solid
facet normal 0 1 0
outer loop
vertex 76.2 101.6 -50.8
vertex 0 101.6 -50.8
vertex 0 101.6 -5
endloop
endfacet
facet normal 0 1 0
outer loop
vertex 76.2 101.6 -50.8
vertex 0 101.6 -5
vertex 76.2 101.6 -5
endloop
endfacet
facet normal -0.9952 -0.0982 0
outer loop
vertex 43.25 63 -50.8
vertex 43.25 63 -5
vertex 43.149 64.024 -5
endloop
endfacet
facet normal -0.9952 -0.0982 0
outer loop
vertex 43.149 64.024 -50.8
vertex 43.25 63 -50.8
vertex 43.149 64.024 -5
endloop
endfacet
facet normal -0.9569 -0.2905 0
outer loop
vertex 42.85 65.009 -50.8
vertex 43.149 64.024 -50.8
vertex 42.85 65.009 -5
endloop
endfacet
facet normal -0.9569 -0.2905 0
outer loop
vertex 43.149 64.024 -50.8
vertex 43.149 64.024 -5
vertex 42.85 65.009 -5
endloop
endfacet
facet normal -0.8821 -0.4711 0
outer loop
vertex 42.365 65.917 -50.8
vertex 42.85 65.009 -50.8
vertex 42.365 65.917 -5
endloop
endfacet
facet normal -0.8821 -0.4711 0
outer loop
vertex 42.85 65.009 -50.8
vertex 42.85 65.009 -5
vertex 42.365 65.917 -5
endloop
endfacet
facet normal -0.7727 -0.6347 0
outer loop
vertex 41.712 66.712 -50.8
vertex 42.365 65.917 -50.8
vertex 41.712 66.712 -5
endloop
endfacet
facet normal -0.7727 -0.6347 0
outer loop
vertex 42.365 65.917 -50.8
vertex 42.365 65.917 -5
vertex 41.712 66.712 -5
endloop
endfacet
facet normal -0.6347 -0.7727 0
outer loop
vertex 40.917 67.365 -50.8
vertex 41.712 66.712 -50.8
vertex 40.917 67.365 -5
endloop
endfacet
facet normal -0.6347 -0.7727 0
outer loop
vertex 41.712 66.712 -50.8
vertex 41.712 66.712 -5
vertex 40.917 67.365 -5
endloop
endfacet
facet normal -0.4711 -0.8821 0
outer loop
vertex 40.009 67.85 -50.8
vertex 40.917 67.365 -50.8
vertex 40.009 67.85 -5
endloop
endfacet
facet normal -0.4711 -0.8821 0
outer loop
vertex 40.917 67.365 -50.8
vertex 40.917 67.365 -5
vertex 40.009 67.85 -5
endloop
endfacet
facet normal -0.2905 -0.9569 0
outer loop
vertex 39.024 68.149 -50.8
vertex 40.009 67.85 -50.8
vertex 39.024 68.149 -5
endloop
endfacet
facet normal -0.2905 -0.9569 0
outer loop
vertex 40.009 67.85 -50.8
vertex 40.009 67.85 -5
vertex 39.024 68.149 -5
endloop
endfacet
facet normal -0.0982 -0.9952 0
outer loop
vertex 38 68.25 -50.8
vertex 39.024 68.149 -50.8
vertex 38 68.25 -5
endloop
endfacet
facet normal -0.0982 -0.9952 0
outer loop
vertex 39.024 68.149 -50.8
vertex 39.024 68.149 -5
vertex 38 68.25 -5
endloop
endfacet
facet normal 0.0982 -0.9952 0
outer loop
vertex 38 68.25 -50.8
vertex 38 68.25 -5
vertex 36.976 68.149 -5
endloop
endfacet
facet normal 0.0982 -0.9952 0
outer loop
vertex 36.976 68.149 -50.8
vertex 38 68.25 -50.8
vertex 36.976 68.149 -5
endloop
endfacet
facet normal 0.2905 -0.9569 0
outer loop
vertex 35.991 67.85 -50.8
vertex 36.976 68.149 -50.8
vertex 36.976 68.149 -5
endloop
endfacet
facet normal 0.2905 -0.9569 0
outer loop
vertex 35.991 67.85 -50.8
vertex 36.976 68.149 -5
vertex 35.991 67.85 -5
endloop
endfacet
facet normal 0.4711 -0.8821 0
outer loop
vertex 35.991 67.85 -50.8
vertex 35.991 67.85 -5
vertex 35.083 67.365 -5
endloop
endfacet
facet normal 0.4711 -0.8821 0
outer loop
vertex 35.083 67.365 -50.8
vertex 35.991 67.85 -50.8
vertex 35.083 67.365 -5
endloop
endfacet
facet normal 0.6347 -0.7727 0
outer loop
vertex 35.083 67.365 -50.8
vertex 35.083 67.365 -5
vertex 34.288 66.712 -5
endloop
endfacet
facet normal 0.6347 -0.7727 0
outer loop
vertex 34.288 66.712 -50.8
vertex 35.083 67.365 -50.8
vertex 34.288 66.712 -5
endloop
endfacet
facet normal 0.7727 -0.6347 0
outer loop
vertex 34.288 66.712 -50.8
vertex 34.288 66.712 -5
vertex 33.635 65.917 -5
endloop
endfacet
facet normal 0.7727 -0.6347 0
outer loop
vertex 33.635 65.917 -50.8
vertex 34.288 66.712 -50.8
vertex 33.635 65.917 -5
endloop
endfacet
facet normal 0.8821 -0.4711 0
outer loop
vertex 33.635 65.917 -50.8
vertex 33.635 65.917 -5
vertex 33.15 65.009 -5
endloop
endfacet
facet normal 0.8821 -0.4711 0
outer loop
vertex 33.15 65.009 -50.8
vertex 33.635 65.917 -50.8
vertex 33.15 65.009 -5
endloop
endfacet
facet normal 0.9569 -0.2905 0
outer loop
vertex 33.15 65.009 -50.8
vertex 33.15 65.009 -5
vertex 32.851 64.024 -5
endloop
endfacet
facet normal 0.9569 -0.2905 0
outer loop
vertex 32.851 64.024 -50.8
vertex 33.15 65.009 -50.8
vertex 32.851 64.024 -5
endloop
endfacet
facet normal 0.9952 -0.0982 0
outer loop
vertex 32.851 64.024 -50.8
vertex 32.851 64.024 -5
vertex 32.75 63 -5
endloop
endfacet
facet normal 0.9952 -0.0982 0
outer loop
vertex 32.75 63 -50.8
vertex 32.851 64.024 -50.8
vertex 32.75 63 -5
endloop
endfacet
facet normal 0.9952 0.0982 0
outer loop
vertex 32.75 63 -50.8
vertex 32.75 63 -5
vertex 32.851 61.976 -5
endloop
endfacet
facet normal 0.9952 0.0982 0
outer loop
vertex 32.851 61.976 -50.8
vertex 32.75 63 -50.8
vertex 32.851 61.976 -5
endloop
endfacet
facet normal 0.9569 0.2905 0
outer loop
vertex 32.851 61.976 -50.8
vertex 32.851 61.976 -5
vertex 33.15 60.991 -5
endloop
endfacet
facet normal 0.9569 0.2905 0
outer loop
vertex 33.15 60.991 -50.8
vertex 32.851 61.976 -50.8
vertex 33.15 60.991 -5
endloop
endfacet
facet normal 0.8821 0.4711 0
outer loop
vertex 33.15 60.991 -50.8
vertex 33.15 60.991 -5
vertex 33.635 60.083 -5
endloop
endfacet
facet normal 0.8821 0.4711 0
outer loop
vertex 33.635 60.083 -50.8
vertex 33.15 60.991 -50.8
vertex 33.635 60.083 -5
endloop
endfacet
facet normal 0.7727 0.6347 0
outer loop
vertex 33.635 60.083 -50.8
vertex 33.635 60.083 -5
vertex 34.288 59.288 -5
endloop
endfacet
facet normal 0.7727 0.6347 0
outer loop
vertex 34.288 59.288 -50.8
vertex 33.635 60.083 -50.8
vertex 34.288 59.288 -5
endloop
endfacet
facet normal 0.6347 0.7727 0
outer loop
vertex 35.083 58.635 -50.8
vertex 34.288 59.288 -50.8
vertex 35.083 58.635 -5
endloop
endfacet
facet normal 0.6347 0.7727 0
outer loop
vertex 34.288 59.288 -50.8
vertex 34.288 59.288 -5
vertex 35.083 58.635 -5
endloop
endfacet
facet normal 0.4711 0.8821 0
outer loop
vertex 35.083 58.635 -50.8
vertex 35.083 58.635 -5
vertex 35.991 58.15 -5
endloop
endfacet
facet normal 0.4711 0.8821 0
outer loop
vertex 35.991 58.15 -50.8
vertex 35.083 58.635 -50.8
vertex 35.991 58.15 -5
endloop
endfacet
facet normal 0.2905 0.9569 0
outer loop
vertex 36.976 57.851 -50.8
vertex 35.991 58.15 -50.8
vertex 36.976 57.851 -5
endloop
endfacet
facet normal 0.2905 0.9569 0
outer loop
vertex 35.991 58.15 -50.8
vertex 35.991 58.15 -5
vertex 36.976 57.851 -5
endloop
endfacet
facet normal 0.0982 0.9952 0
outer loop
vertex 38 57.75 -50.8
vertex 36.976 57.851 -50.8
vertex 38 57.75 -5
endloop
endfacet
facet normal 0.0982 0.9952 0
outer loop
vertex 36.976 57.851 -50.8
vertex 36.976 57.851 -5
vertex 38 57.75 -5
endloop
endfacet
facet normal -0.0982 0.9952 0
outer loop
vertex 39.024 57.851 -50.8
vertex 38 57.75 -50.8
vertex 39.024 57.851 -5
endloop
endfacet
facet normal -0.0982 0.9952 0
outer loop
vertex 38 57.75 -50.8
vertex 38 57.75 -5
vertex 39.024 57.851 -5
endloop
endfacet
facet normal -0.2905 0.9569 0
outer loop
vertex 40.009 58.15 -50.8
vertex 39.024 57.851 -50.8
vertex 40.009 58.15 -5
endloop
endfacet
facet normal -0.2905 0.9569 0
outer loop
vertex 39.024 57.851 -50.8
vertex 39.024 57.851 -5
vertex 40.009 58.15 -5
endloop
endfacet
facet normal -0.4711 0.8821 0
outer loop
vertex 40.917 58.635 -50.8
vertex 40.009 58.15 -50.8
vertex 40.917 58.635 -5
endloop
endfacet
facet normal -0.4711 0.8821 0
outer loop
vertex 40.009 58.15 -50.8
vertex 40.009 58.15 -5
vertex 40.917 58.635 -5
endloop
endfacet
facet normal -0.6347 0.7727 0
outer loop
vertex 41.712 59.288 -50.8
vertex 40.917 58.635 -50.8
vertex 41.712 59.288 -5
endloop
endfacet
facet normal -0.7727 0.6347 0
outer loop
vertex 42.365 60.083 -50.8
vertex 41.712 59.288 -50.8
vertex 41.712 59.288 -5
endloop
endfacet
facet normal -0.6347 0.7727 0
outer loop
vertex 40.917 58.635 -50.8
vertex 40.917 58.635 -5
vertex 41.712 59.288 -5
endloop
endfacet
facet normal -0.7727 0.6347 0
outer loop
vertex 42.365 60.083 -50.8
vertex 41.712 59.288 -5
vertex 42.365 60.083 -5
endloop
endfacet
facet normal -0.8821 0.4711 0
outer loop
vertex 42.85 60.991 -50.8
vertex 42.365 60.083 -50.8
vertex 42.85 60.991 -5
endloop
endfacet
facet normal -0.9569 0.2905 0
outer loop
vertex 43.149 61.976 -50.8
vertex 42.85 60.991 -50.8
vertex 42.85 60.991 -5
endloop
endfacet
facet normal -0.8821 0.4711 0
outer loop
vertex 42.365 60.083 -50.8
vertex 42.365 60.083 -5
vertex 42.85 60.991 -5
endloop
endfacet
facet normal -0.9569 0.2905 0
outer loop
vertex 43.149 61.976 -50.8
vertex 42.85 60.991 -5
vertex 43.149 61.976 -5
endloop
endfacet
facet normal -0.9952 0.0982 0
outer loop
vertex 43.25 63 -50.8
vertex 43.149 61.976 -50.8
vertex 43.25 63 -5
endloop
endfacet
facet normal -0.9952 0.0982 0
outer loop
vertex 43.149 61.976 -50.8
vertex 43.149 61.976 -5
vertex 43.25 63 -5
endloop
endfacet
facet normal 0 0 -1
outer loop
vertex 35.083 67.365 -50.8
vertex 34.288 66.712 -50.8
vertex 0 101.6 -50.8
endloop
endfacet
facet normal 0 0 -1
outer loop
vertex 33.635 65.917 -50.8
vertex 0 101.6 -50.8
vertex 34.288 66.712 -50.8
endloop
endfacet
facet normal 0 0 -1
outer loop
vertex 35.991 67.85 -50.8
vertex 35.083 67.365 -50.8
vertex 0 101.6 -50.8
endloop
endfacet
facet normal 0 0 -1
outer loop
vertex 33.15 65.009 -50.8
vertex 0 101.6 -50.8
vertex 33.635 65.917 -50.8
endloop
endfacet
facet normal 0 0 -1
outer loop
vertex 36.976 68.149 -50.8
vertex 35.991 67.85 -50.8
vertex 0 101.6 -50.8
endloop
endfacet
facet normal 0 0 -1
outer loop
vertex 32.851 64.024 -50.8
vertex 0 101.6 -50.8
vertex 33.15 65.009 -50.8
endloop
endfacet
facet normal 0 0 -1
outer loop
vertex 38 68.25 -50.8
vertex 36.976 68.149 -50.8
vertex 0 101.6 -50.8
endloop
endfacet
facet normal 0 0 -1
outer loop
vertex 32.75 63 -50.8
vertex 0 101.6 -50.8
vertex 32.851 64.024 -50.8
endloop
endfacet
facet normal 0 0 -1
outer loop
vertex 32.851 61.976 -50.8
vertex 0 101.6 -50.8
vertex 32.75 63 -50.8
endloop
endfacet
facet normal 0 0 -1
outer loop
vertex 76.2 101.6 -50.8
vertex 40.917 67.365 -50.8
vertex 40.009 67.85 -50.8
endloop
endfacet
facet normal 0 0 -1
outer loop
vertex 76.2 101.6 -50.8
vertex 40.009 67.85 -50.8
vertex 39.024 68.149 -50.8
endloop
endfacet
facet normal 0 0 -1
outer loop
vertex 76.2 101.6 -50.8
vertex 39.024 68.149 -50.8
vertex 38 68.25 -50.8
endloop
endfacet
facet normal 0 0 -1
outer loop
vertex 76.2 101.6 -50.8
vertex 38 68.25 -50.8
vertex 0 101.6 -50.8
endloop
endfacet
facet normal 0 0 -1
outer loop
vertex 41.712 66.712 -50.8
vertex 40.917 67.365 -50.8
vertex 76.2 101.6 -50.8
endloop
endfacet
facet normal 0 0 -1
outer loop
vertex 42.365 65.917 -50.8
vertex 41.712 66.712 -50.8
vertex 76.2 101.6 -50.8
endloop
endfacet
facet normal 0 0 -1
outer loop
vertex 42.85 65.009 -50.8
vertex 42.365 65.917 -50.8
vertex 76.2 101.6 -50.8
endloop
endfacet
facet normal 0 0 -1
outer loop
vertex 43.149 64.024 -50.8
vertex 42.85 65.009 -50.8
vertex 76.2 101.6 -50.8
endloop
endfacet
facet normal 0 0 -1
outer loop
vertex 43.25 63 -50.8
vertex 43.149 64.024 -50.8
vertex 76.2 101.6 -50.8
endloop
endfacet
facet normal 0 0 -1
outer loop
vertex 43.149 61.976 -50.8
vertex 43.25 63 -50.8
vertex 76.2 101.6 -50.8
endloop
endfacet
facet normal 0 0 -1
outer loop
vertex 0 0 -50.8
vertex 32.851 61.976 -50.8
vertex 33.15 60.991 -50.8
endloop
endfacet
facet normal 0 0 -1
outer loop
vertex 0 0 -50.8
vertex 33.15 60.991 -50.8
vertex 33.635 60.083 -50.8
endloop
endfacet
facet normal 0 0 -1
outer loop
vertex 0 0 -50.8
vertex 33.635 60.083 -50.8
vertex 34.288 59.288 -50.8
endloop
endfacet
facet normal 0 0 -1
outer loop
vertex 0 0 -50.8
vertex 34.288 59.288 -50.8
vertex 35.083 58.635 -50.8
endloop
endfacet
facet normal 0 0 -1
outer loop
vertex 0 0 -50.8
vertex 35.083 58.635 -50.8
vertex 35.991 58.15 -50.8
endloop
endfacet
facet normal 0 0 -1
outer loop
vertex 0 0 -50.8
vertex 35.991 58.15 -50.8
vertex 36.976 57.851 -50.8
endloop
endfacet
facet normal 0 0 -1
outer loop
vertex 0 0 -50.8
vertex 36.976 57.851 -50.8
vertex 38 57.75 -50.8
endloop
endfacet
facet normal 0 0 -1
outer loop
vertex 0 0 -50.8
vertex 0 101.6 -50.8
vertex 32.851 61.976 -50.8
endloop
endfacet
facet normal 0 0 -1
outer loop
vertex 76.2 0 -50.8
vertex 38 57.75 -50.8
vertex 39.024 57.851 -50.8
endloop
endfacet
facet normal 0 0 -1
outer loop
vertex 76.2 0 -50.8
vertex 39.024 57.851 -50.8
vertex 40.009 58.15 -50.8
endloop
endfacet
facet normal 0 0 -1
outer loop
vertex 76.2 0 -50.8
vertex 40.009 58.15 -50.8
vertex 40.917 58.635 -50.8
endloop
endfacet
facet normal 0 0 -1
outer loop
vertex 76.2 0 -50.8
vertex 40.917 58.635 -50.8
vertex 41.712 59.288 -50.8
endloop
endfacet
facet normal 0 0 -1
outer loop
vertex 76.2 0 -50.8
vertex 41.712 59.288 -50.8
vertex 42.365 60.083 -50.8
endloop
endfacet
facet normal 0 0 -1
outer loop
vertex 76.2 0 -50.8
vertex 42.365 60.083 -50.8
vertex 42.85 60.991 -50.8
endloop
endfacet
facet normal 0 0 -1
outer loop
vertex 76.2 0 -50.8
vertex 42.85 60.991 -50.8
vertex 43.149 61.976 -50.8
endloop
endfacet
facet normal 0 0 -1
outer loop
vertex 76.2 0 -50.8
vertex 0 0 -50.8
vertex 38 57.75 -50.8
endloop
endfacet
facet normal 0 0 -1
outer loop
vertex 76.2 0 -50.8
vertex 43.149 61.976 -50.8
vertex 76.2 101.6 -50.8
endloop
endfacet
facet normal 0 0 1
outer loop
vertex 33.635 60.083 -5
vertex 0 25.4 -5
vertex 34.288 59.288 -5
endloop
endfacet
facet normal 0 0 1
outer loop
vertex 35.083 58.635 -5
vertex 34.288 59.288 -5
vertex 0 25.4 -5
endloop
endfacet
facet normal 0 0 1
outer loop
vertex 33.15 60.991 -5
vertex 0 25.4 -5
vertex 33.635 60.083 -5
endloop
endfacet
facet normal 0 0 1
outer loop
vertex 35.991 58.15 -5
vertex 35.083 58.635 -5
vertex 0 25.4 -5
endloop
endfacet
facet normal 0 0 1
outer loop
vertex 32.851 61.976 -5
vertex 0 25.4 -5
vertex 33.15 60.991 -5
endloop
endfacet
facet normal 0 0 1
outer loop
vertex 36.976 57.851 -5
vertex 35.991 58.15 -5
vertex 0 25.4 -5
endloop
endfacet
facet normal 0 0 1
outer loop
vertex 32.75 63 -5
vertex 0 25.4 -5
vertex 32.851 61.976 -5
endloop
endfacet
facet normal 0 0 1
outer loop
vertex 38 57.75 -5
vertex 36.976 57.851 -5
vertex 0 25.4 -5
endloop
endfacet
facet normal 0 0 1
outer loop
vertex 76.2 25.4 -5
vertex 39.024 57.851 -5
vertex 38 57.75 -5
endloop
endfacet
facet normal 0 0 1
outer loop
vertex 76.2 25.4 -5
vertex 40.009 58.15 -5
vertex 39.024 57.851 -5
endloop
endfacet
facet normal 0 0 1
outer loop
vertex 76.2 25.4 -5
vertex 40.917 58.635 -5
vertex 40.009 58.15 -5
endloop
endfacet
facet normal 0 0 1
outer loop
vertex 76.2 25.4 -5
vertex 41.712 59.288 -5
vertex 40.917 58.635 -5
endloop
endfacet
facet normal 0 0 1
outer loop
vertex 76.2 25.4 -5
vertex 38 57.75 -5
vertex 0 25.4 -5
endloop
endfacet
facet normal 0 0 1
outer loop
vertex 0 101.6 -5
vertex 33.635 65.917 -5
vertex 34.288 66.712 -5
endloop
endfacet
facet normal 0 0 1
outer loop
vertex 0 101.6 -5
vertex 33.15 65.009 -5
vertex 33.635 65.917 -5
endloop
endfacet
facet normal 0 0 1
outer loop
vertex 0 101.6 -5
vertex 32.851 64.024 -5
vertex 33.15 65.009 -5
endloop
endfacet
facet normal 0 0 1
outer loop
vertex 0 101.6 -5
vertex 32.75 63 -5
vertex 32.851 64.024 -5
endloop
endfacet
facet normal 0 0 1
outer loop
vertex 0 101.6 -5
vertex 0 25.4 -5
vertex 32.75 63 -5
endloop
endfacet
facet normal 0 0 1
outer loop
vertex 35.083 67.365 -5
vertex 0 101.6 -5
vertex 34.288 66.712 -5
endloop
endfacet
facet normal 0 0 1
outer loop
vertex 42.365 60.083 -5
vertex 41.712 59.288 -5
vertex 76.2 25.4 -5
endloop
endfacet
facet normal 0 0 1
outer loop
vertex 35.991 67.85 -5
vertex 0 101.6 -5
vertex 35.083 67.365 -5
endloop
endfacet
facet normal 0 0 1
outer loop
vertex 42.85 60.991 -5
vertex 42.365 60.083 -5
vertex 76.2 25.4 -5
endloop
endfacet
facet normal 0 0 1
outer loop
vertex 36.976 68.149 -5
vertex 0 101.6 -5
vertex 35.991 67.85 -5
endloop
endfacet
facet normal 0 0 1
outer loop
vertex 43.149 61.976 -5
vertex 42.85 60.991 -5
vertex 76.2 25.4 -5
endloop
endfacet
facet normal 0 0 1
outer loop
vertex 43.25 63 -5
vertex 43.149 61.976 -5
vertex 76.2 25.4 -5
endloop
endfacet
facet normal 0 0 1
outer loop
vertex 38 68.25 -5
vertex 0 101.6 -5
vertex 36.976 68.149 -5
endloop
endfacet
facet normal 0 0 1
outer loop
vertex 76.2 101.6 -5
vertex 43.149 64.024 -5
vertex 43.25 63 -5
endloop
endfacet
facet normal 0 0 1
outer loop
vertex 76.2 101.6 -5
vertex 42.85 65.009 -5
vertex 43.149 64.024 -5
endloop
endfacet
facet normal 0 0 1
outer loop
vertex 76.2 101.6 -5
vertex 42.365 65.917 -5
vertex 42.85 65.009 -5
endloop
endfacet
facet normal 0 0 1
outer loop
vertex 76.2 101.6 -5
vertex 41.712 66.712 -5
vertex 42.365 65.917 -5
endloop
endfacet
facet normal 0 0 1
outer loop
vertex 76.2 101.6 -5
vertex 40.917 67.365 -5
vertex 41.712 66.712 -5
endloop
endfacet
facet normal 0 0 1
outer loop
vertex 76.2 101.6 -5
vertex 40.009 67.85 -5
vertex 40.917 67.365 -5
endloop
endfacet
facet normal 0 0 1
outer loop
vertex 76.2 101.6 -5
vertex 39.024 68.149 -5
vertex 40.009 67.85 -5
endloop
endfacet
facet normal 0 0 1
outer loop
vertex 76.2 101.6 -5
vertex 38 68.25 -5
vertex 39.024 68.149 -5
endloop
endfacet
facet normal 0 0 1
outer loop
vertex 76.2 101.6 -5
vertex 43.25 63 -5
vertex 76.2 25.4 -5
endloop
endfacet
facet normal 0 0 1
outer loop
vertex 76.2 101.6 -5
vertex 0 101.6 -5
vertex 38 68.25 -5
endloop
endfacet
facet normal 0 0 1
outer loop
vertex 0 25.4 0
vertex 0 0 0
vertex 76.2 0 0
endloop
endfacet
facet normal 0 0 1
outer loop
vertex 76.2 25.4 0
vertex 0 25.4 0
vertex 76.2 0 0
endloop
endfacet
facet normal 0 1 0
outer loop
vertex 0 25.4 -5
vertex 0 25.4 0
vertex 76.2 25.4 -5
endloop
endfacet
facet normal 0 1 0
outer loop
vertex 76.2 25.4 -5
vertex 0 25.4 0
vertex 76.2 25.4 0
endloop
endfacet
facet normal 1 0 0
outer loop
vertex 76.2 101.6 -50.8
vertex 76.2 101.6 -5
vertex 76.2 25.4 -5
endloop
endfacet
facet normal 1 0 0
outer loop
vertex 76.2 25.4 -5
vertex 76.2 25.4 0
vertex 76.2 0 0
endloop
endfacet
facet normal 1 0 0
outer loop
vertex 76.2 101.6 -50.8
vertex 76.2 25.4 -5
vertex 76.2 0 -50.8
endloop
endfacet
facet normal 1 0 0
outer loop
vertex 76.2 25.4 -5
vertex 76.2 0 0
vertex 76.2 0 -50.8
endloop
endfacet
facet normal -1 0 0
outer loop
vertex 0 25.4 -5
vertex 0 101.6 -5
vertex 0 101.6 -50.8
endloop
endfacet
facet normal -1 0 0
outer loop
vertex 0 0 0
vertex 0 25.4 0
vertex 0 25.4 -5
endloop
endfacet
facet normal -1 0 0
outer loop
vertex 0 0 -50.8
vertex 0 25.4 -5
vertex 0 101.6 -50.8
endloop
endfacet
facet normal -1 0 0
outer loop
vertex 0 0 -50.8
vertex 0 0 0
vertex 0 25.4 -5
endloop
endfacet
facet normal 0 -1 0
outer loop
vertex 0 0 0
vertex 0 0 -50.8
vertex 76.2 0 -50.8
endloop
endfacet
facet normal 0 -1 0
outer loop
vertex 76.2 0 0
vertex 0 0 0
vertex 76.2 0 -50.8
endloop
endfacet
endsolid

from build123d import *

# Parameters (mm, degrees)
SKETCH1_W           = 76.2
SKETCH1_H           = 50.8
BOSS_EXTRUDE1_DEPTH = 101.6
SKETCH2_R           = 5.25
CUT_EXTRUDE1_DEPTH  = 300
SKETCH3_W           = 76.2
SKETCH3_H           = 76.2
CUT_EXTRUDE2_DEPTH  = 5


with BuildPart() as part:
    # Sketch1 → Boss-Extrude1 (new body)
    with BuildSketch(Plane(origin=(0, 0, 0), x_dir=(1, 0, 0), z_dir=(0, 1, 0))):
        with Locations((38.1, 25.4)):
            Rectangle(SKETCH1_W, SKETCH1_H)
    extrude(amount=BOSS_EXTRUDE1_DEPTH)

    # Sketch2 → Cut-Extrude1 (cut)
    with BuildSketch(Plane.XY):
        with Locations((38, 63)):
            Circle(SKETCH2_R)
    extrude(amount=-CUT_EXTRUDE1_DEPTH, mode=Mode.SUBTRACT)

    # Sketch3 → Cut-Extrude2 (cut)
    with BuildSketch(Plane.XY):
        with Locations((38.1, 63.5)):
            Rectangle(SKETCH3_W, SKETCH3_H)
    extrude(amount=-CUT_EXTRUDE2_DEPTH, mode=Mode.SUBTRACT)


solid = part.part
